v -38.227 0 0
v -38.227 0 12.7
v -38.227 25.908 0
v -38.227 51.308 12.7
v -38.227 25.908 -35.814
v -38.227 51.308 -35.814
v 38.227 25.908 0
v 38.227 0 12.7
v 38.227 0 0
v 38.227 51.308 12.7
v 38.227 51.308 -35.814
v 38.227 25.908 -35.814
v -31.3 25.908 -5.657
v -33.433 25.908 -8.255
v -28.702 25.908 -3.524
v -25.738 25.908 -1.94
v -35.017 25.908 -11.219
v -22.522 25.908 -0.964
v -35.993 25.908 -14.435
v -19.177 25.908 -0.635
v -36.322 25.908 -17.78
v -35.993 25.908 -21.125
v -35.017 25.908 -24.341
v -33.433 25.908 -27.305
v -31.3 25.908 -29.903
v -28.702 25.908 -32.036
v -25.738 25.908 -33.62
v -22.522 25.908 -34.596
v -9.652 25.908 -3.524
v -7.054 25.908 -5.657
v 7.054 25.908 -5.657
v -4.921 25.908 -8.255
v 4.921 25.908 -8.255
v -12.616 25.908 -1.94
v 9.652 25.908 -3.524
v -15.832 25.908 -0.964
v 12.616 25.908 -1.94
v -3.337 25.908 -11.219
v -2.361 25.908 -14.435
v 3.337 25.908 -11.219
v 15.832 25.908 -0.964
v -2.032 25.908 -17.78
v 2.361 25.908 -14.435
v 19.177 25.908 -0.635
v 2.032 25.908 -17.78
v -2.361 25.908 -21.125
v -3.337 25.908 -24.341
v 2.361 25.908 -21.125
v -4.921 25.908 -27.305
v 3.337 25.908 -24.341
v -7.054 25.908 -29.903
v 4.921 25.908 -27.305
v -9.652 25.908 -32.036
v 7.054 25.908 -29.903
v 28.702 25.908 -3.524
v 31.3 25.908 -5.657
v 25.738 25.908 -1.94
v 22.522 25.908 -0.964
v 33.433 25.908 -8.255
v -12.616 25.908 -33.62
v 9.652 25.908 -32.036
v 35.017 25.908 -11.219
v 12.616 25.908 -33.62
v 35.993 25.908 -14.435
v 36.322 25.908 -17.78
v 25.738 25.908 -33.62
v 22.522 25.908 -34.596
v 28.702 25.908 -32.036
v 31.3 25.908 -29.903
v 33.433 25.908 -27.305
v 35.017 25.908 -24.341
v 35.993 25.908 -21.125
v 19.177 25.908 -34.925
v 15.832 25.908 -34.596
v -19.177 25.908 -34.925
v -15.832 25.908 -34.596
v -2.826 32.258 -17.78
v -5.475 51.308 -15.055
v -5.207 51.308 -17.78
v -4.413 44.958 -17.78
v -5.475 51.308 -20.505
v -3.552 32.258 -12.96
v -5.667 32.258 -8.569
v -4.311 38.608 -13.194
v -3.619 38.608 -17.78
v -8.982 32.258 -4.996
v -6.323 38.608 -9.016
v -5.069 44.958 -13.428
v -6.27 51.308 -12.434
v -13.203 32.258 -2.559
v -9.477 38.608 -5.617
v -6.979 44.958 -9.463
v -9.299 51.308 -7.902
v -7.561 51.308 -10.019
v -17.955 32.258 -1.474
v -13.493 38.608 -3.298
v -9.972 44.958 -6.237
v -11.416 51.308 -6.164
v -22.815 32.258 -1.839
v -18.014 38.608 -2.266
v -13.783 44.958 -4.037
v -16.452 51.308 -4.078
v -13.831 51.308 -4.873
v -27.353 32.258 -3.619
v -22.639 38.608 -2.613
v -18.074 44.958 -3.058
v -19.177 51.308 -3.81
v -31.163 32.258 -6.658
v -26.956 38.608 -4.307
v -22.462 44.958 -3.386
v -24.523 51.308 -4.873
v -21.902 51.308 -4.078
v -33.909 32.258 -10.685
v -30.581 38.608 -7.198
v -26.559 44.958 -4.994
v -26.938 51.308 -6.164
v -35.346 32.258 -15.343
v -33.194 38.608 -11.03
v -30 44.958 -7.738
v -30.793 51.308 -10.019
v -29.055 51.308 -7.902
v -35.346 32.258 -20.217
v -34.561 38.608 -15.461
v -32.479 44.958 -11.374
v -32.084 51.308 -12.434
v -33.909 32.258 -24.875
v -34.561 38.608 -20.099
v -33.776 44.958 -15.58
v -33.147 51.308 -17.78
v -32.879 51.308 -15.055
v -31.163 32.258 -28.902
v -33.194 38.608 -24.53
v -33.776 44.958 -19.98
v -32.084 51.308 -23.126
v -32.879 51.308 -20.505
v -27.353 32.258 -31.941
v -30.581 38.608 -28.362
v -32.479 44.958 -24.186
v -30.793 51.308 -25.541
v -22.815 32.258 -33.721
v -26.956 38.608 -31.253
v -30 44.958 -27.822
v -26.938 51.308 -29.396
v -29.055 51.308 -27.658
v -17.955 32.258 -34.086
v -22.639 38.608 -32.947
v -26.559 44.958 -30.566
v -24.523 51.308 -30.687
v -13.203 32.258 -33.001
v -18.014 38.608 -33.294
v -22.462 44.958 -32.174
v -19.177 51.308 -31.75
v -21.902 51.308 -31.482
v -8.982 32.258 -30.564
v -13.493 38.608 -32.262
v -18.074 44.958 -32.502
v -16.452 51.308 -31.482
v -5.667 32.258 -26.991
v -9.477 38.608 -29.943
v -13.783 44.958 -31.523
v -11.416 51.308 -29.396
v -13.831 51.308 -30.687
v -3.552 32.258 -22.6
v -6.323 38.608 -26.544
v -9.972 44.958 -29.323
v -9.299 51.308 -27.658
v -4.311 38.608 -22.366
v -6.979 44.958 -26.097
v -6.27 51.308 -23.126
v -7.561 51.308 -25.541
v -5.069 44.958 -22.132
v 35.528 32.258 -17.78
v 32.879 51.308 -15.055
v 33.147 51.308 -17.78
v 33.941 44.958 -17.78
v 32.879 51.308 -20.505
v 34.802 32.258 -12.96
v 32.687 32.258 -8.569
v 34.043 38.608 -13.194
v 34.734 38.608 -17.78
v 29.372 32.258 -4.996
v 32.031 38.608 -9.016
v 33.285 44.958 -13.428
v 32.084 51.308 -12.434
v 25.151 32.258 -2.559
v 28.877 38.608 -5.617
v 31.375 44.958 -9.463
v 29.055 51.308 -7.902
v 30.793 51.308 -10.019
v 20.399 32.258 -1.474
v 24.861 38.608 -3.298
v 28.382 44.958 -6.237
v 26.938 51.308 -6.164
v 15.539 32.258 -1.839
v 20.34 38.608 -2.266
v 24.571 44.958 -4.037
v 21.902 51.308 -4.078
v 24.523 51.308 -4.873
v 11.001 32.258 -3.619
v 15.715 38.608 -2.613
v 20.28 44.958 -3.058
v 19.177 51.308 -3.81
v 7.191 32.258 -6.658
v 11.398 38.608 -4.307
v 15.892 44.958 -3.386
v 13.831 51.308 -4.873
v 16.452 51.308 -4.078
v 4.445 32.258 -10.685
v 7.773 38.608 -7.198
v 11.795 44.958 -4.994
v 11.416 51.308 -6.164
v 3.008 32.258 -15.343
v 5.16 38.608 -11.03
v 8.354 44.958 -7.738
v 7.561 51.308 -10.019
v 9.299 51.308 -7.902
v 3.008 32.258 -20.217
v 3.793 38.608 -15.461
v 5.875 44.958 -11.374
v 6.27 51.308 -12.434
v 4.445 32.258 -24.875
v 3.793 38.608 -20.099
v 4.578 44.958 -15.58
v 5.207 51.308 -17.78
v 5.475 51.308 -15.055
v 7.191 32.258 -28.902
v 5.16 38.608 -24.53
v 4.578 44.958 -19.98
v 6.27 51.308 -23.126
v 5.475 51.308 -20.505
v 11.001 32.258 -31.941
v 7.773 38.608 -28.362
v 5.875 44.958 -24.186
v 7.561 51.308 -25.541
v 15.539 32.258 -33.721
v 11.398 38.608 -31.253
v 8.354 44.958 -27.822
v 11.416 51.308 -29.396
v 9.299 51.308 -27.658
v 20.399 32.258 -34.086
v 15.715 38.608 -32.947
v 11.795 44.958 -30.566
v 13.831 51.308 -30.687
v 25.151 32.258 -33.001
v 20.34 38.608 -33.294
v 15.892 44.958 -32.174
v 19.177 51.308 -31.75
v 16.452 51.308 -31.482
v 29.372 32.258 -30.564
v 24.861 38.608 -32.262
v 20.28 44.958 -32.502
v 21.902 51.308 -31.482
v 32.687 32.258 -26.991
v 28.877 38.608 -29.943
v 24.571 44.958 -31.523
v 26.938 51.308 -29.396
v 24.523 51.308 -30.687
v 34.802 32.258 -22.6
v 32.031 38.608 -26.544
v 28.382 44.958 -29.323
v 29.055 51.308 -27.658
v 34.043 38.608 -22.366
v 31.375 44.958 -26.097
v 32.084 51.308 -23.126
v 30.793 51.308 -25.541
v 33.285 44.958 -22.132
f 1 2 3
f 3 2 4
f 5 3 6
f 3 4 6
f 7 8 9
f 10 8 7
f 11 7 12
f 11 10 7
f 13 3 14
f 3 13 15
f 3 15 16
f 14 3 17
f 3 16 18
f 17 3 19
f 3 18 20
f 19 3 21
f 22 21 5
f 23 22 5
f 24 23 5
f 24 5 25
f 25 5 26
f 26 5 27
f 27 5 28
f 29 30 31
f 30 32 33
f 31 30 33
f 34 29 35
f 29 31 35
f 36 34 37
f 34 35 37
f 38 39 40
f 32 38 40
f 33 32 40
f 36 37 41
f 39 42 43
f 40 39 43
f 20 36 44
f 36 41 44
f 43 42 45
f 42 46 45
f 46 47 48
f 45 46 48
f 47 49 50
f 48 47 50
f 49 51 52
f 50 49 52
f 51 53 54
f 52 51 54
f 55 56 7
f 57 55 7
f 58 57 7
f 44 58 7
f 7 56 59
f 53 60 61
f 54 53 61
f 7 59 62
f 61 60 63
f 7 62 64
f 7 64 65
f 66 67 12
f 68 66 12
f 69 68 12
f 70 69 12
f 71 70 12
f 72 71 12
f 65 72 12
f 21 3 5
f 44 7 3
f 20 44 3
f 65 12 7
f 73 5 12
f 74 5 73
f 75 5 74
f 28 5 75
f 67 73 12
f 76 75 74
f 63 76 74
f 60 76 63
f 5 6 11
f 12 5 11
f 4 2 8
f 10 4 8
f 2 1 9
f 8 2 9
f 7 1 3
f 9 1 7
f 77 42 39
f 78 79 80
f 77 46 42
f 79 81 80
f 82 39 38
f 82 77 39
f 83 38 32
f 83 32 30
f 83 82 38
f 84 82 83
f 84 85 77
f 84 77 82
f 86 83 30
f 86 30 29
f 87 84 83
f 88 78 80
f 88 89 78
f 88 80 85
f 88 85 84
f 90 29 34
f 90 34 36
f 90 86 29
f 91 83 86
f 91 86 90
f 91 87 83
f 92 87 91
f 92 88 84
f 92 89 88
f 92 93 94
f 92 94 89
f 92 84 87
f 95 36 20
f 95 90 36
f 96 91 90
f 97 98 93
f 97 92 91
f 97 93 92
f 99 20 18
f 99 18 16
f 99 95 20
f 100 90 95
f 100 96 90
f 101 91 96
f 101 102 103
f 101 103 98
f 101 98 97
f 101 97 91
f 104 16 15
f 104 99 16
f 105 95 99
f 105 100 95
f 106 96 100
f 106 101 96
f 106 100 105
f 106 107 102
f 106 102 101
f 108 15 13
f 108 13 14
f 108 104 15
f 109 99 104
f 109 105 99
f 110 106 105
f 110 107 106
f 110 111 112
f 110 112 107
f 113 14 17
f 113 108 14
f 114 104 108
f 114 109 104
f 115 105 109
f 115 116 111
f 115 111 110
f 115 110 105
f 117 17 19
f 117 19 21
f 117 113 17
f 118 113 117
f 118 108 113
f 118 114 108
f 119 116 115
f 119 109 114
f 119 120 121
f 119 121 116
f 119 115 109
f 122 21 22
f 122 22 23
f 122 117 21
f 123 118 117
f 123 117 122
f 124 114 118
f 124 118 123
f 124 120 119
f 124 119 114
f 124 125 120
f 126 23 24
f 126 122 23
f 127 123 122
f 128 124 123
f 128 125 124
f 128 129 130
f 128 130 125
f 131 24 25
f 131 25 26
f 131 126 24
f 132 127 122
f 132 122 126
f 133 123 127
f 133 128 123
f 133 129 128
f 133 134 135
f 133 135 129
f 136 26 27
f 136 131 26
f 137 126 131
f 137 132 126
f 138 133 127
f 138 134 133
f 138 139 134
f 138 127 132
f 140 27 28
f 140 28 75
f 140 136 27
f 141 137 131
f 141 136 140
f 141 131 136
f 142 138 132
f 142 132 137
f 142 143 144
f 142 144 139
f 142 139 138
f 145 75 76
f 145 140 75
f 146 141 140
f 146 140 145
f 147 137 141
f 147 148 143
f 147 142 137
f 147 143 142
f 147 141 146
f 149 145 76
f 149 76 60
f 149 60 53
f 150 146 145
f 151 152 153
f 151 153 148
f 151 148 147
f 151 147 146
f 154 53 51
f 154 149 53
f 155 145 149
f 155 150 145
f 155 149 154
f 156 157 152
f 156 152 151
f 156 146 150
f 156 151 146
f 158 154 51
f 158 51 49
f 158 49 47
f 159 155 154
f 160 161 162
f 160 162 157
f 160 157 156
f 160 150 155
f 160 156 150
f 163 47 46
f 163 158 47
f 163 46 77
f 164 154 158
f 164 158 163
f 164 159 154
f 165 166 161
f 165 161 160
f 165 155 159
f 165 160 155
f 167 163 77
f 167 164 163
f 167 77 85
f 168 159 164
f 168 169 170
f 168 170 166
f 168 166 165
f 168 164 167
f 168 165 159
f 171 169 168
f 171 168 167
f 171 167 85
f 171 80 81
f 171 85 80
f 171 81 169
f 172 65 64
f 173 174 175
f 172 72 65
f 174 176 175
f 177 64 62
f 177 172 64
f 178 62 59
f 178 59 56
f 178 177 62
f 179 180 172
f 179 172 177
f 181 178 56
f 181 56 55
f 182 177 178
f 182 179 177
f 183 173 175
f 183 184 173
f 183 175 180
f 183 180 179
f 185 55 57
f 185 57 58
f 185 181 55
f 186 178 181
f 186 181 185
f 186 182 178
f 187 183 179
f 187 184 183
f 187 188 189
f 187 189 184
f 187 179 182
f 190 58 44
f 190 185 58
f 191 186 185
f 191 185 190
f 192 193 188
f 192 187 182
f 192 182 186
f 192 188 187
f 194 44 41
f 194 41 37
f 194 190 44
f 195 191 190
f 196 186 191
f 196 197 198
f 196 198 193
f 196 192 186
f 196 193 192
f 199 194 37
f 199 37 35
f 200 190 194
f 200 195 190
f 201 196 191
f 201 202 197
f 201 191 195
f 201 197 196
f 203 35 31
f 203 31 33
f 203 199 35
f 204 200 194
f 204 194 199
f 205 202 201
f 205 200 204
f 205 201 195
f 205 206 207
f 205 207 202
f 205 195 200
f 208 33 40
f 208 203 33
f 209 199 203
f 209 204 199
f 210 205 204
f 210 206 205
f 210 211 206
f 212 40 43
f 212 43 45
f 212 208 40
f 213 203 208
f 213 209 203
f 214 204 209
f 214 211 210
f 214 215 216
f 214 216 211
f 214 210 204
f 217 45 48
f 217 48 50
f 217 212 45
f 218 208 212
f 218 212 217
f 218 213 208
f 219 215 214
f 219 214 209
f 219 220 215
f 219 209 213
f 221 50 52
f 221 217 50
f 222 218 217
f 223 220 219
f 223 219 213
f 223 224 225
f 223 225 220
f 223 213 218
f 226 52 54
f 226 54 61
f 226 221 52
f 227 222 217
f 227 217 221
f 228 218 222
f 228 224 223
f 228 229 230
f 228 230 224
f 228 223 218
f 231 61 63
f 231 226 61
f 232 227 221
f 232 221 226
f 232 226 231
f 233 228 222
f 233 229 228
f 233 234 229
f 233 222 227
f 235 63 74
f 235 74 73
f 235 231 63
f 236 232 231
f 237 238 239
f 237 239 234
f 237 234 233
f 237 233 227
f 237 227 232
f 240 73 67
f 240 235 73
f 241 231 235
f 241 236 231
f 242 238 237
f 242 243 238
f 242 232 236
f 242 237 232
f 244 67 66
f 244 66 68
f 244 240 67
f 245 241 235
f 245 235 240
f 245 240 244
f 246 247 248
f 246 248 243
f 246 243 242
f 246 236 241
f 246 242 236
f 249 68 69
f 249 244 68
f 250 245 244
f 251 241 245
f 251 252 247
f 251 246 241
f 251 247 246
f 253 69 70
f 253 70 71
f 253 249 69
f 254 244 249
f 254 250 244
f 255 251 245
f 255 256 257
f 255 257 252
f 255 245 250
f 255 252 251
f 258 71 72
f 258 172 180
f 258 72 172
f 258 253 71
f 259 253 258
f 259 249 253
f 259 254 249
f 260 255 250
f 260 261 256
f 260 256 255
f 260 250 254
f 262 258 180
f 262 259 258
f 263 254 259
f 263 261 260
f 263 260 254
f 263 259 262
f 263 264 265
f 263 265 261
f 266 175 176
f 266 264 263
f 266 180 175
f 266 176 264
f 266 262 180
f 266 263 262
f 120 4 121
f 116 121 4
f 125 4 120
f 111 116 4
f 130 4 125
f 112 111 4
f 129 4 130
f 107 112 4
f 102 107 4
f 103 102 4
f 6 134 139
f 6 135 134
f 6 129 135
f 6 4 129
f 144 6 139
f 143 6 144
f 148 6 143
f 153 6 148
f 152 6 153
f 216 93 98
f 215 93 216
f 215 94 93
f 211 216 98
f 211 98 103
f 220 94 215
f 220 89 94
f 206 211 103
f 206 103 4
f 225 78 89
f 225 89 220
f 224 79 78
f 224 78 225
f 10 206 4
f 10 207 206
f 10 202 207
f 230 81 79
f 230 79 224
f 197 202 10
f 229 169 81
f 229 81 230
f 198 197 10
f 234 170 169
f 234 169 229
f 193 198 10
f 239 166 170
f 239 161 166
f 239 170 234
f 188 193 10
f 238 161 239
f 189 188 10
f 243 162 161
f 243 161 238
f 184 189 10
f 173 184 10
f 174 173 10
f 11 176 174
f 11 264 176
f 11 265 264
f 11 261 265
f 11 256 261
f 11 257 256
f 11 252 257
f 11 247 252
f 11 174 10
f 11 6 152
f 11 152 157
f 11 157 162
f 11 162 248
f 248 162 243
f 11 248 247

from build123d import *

# Parameters (mm, degrees)
SKETCH1_W           = 76.454
SKETCH1_H           = 12.7
BOSS_EXTRUDE1_DEPTH = 51.308
SKETCH2_W           = 76.454
SKETCH2_H           = 35.814
BOSS_EXTRUDE2_DEPTH = 25.4
SKETCH3_R           = 17.145
SKETCH4_R           = 13.97
SKETCH3_3_R         = 17.145
SKETCH4_3_R         = 13.97


with BuildPart() as part:
    # Sketch1 → Boss-Extrude1 (new body)
    with BuildSketch(Plane(origin=(0, 0, 0), x_dir=(1, 0, 0), z_dir=(0, 1, 0))):
        with Locations((0, -6.35)):
            Rectangle(SKETCH1_W, SKETCH1_H)
    extrude(amount=BOSS_EXTRUDE1_DEPTH)

    # Sketch2 → Boss-Extrude2 (add)
    with BuildSketch(Plane(origin=(0, 51.308, 0), x_dir=(1, 0, 0), z_dir=(0, 1, 0))):
        with Locations((0, 17.907)):
            Rectangle(SKETCH2_W, SKETCH2_H)
    extrude(amount=-BOSS_EXTRUDE2_DEPTH)

    # Sketch3 → Cut-Loft2 section 0
    with BuildSketch(Plane.XZ.offset(-25.908)):
        with Locations((19.177, -17.78)):
            Circle(SKETCH3_R)
    # Sketch4 → Cut-Loft2 section 1
    with BuildSketch(Plane(origin=(0, 51.308, 0), x_dir=(1, 0, 0), z_dir=(0, 1, 0))):
        with Locations((19.177, 17.78)):
            Circle(SKETCH4_R)
    loft(mode=Mode.SUBTRACT)

    # Sketch3<3> → Cut-Loft3 section 0
    with BuildSketch(Plane.XZ.offset(-25.908)):
        with Locations((-19.177, -17.78)):
            Circle(SKETCH3_3_R)
    # Sketch4<3> → Cut-Loft3 section 1
    with BuildSketch(Plane(origin=(0, 51.308, 0), x_dir=(1, 0, 0), z_dir=(0, 1, 0))):
        with Locations((-19.177, 17.78)):
            Circle(SKETCH4_3_R)
    loft(mode=Mode.SUBTRACT)


solid = part.part
